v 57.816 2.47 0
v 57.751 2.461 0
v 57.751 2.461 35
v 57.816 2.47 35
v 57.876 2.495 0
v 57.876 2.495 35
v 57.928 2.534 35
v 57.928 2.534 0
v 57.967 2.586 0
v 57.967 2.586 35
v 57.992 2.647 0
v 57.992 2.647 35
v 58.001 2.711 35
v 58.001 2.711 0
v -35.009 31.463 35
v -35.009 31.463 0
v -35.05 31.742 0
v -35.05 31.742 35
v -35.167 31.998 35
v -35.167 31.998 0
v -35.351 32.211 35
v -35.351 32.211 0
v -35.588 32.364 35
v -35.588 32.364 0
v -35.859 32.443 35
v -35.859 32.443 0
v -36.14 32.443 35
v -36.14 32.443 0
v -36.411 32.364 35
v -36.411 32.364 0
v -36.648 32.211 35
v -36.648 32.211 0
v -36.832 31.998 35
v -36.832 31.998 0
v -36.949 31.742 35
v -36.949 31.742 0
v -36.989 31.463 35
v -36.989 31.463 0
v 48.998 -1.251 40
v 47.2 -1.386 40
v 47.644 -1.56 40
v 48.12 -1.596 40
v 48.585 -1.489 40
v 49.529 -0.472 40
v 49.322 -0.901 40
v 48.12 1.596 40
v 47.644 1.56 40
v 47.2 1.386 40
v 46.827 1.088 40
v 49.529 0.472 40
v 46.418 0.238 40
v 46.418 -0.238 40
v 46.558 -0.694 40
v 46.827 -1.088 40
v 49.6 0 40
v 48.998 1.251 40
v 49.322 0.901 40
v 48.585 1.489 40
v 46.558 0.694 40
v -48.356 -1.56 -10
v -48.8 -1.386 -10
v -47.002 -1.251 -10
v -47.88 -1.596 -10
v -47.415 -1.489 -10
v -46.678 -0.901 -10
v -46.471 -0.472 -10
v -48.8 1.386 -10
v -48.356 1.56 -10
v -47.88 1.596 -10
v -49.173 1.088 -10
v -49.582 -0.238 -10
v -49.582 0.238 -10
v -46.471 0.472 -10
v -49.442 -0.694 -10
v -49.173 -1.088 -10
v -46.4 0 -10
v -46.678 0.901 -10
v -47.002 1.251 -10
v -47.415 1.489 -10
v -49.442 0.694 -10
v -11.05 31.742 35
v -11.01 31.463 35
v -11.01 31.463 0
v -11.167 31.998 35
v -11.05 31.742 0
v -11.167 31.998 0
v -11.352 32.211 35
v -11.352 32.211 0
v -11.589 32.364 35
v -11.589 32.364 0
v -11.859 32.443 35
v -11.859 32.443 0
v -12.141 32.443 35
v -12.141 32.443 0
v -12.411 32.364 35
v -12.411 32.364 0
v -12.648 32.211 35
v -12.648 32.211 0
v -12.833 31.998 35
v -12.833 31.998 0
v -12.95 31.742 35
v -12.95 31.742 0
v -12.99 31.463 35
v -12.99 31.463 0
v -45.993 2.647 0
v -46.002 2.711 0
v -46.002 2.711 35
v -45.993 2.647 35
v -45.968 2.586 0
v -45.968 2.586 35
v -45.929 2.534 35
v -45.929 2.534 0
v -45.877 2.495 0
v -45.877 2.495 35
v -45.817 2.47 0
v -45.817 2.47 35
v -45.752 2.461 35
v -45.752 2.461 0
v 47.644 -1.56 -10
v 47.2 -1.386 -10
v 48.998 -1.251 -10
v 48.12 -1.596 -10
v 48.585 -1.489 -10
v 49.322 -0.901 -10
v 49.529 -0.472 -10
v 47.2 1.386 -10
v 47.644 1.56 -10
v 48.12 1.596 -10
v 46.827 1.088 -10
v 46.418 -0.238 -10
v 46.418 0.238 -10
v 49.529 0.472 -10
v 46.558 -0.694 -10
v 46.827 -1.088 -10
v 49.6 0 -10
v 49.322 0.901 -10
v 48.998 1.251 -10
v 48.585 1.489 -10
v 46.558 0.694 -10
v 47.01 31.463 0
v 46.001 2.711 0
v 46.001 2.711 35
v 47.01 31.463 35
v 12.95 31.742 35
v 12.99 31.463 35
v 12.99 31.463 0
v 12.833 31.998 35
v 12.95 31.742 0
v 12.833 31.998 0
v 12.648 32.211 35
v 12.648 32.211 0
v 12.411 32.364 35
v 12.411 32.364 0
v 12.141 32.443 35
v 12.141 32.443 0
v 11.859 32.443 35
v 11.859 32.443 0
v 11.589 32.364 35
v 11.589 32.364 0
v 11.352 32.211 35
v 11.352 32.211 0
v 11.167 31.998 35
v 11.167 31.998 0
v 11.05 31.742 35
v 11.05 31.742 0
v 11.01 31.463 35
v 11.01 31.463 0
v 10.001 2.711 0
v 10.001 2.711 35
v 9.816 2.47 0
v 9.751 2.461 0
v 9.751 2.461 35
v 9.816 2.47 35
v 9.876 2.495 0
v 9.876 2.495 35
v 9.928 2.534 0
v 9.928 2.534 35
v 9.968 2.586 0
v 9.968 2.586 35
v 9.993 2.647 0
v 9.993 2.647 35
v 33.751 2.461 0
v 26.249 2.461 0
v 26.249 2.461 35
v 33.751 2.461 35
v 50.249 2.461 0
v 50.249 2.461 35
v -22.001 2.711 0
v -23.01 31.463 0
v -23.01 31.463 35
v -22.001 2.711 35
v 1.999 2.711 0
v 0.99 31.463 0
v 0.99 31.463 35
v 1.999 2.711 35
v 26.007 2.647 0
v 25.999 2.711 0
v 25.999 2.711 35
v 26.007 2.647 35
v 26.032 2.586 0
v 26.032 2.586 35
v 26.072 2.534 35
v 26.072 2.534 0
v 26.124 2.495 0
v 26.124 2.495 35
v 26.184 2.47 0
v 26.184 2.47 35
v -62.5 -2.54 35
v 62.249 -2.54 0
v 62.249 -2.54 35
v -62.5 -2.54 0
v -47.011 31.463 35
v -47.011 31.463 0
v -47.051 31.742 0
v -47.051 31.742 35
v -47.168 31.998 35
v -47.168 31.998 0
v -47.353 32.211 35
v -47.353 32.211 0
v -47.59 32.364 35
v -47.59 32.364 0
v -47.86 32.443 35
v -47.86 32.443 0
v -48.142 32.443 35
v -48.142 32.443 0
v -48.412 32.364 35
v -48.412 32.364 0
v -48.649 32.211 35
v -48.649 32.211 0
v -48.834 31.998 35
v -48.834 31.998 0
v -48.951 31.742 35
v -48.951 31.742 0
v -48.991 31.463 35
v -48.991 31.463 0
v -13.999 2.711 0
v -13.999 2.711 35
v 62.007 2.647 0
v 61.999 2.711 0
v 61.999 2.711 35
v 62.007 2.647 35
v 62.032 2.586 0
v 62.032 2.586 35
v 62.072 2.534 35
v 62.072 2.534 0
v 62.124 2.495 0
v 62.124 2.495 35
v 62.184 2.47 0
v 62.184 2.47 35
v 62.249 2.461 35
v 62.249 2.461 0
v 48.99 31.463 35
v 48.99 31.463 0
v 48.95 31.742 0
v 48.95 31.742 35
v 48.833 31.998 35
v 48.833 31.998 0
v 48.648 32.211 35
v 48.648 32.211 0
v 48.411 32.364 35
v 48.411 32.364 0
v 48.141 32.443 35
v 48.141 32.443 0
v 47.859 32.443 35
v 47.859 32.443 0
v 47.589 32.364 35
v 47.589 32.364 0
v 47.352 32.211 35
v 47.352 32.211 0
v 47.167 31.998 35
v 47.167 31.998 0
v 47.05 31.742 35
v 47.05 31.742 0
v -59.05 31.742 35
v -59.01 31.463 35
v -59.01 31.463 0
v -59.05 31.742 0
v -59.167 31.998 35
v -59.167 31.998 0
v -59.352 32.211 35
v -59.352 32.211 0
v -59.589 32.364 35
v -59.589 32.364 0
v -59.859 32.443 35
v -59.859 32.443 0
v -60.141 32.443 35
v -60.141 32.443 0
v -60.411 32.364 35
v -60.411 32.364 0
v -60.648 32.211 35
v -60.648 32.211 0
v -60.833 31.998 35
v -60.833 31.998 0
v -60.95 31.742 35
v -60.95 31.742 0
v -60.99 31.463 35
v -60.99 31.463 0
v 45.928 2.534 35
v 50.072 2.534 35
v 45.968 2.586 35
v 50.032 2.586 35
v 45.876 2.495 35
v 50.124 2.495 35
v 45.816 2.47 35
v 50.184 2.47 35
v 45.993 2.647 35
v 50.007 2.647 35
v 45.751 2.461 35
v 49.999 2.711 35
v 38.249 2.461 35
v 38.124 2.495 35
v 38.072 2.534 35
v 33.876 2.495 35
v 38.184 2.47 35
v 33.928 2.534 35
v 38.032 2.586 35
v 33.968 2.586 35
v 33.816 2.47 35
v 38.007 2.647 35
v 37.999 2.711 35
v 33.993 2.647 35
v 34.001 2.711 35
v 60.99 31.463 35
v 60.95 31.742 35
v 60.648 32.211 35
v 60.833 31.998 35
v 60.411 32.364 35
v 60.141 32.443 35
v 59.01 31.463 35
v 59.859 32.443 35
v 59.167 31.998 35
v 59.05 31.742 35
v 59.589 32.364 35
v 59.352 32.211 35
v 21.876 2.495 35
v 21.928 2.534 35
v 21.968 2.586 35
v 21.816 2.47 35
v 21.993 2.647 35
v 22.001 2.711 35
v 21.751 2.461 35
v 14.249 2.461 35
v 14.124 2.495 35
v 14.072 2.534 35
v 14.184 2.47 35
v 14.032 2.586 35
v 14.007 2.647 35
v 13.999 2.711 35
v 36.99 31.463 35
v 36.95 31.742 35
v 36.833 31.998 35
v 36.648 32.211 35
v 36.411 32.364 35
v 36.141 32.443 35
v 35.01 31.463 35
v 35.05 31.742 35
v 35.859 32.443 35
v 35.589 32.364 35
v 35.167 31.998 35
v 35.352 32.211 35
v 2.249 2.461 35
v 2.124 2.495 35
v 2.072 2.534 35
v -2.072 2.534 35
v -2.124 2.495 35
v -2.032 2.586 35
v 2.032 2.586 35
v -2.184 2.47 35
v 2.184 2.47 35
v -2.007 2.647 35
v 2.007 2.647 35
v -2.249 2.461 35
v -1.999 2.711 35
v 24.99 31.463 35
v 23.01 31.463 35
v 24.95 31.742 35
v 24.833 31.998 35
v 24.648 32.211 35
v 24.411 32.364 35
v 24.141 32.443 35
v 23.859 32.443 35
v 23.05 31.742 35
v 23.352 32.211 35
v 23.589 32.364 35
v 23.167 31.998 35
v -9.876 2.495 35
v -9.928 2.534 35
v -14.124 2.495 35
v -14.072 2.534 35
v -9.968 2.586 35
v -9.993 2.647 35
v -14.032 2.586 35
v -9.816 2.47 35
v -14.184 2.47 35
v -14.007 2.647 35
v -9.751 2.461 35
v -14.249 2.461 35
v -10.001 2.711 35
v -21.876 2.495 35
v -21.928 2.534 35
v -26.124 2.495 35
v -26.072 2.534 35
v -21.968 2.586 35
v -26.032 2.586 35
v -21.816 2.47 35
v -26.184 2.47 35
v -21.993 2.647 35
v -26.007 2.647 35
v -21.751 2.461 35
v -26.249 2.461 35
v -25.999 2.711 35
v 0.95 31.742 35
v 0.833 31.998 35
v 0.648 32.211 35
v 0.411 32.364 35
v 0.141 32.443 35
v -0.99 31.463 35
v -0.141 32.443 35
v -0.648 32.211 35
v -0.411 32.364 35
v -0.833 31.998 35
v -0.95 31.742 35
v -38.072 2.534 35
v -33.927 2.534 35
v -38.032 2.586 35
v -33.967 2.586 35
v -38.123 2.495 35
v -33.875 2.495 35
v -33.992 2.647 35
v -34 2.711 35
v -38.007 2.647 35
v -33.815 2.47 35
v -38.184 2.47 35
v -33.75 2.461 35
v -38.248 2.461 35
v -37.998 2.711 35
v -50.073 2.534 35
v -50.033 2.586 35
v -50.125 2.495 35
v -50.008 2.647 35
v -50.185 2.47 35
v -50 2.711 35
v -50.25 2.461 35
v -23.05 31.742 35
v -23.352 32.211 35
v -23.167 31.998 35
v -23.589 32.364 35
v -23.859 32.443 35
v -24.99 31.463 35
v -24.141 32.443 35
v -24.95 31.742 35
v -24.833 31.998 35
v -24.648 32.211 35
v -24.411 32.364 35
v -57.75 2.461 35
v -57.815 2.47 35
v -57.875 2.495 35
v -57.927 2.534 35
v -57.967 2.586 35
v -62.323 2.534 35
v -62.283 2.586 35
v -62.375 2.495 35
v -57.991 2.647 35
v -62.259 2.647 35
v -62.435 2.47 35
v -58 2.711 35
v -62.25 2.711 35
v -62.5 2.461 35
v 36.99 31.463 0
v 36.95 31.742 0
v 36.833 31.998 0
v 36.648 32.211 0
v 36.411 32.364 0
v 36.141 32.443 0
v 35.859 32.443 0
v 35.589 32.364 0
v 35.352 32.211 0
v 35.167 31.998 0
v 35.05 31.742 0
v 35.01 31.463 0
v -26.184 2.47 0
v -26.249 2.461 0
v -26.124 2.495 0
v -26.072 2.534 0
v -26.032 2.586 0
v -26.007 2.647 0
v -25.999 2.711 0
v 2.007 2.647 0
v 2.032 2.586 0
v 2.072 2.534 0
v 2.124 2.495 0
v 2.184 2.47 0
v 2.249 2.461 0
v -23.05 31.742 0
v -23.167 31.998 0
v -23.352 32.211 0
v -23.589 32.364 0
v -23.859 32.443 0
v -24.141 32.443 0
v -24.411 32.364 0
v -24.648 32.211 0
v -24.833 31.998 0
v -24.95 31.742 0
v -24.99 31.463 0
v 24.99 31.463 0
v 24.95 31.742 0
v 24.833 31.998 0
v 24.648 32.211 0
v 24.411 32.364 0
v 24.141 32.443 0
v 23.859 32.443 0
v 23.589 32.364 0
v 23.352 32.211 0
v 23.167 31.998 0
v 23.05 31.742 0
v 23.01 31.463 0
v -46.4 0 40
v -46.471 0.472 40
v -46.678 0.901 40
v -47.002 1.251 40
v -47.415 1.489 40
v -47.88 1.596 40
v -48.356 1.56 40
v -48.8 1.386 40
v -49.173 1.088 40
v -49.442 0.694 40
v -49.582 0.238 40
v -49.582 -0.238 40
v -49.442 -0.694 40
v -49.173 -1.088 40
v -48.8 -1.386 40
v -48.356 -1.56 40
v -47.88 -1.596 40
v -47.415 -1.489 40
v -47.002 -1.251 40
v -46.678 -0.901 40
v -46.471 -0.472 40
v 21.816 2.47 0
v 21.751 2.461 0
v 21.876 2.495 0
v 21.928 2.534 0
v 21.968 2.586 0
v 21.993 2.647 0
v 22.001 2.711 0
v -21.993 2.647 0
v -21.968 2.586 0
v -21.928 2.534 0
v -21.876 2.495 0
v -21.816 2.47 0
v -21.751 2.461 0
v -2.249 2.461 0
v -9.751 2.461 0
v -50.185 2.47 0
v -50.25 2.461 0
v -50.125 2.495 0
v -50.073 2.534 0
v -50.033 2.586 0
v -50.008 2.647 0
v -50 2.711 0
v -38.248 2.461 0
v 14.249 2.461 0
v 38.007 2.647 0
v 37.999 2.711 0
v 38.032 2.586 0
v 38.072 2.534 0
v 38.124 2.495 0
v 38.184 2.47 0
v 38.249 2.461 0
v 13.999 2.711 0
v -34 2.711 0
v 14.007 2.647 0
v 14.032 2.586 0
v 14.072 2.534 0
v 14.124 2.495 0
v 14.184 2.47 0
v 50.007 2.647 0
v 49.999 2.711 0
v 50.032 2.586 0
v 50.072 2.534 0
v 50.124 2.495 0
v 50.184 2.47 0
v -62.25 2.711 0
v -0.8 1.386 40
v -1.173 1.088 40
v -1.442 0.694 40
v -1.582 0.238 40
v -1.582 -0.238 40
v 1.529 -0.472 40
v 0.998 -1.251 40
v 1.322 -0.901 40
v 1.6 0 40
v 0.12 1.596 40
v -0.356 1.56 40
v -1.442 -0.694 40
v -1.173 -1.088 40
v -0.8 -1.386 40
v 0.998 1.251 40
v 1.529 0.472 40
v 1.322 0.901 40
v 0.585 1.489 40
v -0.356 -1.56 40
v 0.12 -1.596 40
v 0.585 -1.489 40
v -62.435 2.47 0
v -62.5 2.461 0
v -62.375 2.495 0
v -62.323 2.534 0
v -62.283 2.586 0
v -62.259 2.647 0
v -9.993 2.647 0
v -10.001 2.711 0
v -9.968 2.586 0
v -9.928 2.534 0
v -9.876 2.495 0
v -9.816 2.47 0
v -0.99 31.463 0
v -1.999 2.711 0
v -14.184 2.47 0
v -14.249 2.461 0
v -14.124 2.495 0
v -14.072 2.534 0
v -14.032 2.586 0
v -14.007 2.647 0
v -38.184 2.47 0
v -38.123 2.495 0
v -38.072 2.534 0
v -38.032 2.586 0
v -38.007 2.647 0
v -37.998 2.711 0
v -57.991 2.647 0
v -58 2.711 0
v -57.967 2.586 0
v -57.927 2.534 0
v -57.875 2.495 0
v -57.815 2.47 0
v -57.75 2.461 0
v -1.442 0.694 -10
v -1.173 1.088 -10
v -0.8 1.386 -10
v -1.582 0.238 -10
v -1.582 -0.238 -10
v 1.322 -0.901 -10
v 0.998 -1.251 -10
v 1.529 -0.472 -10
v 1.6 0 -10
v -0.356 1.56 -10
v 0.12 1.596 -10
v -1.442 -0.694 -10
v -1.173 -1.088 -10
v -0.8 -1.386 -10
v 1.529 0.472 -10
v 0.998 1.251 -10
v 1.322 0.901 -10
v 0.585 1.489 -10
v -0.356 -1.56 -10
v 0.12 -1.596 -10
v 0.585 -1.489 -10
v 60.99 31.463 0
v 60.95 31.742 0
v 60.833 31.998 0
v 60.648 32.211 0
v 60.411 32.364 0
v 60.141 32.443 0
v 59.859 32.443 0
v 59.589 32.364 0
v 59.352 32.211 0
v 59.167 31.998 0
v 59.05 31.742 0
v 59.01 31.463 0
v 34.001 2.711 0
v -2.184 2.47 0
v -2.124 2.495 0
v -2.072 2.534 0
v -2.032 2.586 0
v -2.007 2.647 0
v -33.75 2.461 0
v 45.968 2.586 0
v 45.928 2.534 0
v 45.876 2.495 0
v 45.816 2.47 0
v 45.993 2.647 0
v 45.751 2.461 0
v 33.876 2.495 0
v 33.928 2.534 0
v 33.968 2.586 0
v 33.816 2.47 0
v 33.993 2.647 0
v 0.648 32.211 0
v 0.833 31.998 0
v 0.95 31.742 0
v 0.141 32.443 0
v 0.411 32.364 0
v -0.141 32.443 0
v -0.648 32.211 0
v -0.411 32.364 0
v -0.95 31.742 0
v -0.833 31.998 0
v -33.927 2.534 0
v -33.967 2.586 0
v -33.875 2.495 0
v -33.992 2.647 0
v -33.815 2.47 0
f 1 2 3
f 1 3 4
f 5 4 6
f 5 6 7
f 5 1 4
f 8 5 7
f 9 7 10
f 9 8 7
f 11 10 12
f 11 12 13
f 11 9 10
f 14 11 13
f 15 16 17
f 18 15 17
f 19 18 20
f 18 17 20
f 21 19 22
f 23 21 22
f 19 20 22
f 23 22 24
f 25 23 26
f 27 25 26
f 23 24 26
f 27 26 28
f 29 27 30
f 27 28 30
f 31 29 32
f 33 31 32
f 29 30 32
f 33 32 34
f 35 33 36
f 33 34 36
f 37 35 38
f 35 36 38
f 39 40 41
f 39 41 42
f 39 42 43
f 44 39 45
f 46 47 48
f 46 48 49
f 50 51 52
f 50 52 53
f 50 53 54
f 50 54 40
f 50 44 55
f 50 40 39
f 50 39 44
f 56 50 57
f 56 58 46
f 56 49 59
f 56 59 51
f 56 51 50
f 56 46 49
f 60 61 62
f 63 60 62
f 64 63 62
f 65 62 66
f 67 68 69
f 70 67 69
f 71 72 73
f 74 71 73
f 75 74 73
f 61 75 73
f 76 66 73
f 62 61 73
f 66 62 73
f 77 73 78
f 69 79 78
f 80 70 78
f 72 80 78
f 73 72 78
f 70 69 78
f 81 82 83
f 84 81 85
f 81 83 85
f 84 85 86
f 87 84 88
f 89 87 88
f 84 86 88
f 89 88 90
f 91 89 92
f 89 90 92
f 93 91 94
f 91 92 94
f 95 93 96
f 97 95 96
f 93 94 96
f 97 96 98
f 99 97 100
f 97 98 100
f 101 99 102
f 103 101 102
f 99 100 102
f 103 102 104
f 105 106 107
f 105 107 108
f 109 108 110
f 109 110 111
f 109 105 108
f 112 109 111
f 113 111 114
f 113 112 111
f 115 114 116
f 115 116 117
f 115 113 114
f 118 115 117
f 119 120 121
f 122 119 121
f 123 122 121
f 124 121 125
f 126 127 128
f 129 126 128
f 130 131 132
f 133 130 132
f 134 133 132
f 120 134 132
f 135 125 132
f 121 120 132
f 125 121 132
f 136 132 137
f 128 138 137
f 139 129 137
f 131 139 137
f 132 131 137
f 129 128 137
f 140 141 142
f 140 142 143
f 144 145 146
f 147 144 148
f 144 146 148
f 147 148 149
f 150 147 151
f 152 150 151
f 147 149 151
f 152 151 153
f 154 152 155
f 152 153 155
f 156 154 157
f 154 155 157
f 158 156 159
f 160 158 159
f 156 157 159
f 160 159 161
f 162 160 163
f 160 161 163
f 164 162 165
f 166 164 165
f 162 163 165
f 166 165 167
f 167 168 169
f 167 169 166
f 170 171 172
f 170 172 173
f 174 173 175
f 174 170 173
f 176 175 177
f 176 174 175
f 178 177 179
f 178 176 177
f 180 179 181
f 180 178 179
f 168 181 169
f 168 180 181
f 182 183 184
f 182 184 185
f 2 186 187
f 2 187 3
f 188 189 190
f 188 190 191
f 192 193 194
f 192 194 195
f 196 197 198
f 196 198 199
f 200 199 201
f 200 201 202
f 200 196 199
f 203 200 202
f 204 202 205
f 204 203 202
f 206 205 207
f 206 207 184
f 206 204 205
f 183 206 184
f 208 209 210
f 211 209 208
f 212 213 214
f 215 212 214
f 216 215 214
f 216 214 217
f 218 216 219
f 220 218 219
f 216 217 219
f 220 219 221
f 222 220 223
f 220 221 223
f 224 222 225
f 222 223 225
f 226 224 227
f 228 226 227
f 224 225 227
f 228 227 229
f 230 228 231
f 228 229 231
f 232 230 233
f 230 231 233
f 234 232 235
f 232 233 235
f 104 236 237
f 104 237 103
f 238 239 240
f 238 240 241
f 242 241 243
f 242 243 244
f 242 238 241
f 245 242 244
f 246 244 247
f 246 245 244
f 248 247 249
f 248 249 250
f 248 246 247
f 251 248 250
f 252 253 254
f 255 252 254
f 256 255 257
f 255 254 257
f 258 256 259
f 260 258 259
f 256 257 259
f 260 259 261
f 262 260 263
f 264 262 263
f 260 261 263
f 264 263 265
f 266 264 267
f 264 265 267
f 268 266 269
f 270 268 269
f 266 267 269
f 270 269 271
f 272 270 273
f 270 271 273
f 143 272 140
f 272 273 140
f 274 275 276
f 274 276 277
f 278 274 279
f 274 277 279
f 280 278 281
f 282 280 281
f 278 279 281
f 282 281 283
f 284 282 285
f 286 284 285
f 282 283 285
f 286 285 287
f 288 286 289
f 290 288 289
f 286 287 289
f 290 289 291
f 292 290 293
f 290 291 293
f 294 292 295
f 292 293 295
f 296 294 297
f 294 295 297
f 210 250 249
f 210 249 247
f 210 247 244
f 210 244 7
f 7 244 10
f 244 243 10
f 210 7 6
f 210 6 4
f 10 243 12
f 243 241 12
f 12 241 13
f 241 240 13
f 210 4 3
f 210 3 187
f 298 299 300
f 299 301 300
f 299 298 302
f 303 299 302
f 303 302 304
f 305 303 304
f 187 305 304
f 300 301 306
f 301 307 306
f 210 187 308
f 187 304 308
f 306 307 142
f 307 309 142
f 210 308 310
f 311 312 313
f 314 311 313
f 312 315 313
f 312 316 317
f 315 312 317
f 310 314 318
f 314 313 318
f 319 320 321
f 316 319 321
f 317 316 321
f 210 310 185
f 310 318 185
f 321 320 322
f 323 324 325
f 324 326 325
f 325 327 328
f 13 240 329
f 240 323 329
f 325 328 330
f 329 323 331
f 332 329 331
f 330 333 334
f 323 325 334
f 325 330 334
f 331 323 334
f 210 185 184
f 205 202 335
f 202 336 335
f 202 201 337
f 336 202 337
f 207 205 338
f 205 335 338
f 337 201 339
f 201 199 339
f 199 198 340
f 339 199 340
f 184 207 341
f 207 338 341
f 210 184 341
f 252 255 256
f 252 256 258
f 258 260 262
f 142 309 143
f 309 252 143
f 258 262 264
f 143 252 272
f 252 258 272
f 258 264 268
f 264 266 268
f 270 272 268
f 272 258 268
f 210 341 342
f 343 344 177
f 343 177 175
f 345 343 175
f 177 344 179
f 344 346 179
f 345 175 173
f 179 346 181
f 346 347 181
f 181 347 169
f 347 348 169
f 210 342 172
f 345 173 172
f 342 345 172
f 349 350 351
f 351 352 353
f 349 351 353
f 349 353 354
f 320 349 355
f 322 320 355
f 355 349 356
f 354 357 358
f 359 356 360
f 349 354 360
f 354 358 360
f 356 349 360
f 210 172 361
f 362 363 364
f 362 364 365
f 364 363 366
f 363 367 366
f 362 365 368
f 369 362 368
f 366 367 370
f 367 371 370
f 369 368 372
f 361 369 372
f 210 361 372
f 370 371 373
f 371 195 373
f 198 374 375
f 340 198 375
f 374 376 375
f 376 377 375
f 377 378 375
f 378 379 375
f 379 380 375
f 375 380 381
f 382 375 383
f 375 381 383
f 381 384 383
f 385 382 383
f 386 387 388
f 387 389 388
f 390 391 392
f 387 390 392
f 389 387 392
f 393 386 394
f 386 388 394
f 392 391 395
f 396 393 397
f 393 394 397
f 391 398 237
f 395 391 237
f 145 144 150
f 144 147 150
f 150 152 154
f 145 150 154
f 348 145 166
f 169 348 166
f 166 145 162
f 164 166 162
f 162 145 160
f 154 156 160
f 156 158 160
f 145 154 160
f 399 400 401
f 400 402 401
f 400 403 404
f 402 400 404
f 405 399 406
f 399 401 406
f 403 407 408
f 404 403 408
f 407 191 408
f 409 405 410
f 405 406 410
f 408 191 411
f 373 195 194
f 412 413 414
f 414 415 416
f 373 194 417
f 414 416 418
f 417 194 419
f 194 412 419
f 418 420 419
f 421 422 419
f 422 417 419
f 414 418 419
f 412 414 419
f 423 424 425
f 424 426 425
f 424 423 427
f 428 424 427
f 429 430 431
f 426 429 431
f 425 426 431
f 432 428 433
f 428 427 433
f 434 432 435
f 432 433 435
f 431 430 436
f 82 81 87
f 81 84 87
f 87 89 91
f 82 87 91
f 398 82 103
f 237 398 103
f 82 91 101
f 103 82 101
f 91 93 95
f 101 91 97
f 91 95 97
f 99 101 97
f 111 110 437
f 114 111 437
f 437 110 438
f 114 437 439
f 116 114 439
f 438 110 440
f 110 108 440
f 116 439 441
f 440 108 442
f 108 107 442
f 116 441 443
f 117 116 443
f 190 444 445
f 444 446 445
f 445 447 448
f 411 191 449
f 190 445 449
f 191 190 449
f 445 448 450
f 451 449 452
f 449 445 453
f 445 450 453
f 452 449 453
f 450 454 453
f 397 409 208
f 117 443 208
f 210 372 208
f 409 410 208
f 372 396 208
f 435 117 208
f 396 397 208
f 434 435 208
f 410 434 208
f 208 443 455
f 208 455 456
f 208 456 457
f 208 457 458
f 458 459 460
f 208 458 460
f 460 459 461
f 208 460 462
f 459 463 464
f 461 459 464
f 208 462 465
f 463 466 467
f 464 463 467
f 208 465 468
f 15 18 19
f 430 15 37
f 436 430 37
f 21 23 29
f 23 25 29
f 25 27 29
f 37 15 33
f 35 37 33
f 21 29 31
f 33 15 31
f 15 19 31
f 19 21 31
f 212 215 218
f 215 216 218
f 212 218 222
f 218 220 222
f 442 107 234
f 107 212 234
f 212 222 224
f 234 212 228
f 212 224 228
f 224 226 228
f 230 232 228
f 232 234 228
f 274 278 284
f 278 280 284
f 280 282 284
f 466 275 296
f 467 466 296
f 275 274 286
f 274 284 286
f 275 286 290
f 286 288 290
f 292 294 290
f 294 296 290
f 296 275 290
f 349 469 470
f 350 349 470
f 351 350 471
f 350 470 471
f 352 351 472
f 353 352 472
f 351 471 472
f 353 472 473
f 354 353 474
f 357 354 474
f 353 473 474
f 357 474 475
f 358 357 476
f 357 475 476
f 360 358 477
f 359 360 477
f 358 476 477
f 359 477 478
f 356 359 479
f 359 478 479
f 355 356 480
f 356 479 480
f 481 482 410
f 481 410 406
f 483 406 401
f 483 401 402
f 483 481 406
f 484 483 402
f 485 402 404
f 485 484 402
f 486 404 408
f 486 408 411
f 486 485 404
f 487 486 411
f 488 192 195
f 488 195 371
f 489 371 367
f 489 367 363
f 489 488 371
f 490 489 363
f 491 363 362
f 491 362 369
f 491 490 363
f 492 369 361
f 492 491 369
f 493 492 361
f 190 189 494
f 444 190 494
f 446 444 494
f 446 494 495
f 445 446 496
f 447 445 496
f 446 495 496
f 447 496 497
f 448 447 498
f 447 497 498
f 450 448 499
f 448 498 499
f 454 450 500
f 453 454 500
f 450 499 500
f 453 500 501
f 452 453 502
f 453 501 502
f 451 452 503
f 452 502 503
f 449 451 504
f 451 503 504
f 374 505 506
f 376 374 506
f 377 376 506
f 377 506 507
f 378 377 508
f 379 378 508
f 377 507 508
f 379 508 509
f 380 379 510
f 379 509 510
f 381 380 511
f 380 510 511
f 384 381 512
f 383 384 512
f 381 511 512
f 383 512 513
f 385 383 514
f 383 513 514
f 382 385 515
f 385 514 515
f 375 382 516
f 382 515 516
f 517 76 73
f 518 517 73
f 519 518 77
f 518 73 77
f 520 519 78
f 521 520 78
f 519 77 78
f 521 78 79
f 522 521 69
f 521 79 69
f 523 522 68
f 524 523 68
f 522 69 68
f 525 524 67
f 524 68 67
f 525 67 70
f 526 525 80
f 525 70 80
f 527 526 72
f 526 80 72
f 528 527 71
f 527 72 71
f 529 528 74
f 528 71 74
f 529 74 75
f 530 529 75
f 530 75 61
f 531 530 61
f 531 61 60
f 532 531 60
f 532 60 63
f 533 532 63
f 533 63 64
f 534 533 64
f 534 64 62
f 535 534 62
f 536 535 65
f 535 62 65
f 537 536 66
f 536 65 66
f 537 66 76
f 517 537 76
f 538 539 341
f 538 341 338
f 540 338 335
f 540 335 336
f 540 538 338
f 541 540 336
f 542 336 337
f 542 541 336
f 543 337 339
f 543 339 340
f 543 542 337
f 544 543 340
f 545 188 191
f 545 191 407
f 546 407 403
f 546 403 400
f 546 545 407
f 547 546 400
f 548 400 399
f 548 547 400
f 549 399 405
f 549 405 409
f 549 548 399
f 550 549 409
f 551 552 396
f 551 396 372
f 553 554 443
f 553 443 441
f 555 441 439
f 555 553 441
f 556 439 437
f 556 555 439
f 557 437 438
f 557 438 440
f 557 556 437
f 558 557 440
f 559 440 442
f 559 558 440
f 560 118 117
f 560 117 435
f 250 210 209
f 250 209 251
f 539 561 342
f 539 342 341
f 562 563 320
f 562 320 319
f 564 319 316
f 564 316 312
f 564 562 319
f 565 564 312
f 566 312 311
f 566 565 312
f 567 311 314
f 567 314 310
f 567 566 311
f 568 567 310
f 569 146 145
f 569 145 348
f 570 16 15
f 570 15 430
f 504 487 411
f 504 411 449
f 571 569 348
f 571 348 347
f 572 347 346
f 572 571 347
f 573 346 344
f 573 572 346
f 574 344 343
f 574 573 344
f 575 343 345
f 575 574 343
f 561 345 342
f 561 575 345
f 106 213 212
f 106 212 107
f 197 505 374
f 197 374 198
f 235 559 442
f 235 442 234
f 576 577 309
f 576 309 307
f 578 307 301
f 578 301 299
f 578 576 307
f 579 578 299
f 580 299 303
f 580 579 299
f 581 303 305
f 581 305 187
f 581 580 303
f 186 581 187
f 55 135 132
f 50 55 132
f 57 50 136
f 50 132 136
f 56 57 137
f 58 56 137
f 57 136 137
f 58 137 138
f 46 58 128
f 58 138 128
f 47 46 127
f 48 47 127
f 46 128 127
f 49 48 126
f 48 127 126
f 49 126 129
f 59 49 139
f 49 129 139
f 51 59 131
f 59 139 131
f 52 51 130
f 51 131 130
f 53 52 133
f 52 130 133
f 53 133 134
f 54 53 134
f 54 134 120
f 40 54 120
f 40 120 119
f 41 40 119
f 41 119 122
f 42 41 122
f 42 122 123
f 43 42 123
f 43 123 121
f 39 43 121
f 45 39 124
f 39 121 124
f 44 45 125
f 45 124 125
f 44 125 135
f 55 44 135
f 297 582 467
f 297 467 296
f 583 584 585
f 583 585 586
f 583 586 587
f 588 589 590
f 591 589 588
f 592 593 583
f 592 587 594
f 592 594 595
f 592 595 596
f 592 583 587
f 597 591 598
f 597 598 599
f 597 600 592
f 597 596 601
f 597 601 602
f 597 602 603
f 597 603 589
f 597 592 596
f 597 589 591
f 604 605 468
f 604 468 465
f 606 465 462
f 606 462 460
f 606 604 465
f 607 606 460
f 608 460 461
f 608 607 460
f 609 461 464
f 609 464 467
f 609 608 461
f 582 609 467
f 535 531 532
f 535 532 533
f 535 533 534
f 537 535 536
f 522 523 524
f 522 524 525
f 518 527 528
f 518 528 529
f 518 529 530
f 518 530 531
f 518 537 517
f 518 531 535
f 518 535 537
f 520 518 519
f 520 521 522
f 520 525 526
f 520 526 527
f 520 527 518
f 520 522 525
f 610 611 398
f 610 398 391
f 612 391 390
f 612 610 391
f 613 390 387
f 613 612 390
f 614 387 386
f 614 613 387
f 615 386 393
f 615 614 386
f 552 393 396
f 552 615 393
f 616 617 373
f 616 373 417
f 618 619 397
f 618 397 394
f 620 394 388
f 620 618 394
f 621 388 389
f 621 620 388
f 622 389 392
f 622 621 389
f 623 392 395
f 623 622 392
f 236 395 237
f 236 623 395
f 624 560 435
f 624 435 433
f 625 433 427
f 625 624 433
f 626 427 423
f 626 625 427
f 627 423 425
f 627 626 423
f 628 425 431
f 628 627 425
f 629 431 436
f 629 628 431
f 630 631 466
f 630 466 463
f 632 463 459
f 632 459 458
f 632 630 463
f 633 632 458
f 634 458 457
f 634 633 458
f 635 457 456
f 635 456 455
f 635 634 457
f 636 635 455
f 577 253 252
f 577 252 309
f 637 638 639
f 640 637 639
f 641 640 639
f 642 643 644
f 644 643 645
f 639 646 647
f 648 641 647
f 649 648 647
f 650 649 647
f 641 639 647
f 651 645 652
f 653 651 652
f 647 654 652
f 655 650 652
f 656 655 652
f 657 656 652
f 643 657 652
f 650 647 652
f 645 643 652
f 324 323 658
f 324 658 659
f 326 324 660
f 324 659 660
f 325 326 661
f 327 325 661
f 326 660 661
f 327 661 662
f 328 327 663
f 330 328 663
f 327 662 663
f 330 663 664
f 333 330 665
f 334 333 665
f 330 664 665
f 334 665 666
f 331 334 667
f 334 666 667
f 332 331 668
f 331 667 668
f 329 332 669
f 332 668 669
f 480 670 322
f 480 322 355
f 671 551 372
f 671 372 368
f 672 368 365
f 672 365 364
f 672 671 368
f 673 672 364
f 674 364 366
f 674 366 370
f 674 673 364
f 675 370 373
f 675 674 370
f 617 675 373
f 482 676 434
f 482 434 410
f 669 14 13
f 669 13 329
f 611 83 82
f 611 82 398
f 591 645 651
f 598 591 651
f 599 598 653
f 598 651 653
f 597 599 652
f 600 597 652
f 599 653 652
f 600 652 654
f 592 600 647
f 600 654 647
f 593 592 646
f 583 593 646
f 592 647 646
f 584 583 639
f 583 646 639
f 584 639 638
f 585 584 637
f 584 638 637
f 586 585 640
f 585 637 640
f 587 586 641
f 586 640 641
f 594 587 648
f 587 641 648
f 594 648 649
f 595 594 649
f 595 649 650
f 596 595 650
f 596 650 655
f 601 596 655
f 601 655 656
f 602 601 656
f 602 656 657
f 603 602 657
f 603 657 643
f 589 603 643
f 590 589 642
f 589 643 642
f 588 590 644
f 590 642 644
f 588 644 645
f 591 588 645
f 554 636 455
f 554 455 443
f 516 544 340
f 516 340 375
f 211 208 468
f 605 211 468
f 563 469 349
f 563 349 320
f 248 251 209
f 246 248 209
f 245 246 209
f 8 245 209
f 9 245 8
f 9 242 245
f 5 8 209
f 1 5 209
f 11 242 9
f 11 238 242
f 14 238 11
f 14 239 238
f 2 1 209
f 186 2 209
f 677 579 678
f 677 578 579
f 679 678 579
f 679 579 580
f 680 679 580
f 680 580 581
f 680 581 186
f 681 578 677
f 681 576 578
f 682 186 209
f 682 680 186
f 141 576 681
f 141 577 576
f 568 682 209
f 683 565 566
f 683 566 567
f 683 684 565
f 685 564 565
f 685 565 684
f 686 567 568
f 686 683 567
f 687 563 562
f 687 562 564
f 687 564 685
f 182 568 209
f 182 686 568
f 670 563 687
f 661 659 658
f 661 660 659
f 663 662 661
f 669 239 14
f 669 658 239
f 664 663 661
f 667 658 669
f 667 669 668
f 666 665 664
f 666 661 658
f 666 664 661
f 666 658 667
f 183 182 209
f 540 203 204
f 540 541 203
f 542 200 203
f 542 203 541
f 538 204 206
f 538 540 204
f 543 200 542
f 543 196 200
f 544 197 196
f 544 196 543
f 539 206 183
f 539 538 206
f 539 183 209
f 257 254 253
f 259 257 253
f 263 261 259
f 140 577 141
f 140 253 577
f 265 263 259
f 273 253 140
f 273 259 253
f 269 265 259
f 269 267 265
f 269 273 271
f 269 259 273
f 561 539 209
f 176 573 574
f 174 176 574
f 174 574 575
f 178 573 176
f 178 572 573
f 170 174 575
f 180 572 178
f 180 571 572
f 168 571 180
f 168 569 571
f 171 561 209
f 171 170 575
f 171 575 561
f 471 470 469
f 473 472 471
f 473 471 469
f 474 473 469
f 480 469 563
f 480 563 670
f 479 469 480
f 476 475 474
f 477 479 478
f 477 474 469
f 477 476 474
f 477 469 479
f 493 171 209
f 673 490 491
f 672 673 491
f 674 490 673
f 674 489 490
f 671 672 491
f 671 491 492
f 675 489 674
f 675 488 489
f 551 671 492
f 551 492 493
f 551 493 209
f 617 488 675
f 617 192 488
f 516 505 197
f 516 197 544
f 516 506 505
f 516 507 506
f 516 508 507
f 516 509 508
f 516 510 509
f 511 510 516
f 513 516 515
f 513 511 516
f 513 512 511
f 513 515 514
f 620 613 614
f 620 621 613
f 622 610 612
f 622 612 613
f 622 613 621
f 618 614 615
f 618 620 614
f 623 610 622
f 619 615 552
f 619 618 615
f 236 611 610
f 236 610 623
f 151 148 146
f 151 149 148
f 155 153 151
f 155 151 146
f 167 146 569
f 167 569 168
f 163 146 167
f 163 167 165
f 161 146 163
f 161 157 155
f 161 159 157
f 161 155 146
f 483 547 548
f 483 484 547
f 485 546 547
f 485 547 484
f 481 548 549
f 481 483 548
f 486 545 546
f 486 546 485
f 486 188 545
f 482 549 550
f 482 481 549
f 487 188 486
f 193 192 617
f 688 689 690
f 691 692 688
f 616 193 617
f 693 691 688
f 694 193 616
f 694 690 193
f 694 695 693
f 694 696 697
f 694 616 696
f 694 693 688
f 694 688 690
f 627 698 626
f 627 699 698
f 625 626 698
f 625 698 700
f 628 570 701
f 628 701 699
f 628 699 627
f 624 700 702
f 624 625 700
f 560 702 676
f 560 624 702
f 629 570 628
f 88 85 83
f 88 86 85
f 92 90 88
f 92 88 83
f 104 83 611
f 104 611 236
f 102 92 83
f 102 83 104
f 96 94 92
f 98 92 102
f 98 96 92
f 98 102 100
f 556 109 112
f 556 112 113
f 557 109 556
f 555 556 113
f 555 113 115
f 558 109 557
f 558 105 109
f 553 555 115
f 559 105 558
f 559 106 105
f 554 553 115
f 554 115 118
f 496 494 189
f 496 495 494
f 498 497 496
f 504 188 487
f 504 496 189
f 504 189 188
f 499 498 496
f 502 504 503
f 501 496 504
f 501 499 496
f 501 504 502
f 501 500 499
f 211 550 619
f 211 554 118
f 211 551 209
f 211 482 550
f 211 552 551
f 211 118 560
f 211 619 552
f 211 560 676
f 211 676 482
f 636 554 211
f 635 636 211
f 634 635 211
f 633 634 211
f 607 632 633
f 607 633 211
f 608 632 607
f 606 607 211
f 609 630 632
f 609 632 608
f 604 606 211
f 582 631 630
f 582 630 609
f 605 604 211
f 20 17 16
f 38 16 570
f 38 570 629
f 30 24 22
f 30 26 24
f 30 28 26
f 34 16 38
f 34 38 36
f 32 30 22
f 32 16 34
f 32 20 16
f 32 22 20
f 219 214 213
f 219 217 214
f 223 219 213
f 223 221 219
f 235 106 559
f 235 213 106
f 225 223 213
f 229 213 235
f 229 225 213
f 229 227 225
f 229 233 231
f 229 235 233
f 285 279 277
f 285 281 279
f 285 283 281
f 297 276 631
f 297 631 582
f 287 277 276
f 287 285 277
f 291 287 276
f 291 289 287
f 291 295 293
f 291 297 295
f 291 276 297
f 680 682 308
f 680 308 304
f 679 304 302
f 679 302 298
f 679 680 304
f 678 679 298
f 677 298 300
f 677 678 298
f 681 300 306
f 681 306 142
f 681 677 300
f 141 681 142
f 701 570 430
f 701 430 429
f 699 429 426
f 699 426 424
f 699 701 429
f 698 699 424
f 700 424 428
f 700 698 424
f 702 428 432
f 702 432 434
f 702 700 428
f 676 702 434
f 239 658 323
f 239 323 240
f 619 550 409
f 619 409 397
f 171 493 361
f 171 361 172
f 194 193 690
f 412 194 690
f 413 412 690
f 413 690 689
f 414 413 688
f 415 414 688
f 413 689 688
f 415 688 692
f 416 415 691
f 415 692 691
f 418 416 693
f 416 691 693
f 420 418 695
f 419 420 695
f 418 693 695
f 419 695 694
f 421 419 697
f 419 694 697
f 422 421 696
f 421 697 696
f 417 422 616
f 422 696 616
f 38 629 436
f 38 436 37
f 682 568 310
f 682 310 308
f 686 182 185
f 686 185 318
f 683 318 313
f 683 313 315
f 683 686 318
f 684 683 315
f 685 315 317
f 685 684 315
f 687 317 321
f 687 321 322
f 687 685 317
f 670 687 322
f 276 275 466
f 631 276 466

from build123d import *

# Parameters (mm, degrees)
PAD_DEPTH         = 35
CYLINDER_R        = 1.6
CYLINDER_DEPTH    = 50
CYLINDER001_R     = 1.6
CYLINDER001_DEPTH = 50
CYLINDER002_R     = 1.6
CYLINDER002_DEPTH = 50


with BuildPart() as body:
    # Sketch → Pad (new body)
    with BuildSketch(Plane.XY):
        with BuildLine():
            Line((62.24886, -2.54), (-62.5, -2.54))
            Line((-62.5, -2.54), (-62.5, 2.46126))
            ThreePointArc((-62.5, 2.46126), (-62.323223, 2.534483), (-62.25, 2.71126))
            Line((-62.25, 2.71126), (-60.98988, 31.46298))
            ThreePointArc((-59.00988, 31.46298), (-59.99988, 32.45298), (-60.98988, 31.46298))
            Line((-59.00988, 31.46298), (-58, 2.71126))
            ThreePointArc((-58, 2.71126), (-57.926777, 2.534483), (-57.75, 2.46126))
            Line((-57.75, 2.46126), (-50.2499, 2.46126))
            ThreePointArc((-50.2499, 2.46126), (-50.073123, 2.534483), (-49.9999, 2.71126))
            Line((-49.9999, 2.71126), (-48.99092, 31.46298))
            ThreePointArc((-47.01092, 31.46298), (-48.00092, 32.45298), (-48.99092, 31.46298))
            Line((-47.01092, 31.46298), (-46.00194, 2.71126))
            ThreePointArc((-46.00194, 2.71126), (-45.928717, 2.534483), (-45.75194, 2.46126))
            Line((-45.75194, 2.46126), (-38.2484, 2.46126))
            ThreePointArc((-38.2484, 2.46126), (-38.071623, 2.534483), (-37.9984, 2.71126))
            Line((-37.9984, 2.71126), (-36.98942, 31.46298))
            ThreePointArc((-35.00942, 31.46298), (-35.99942, 32.45298), (-36.98942, 31.46298))
            Line((-35.00942, 31.46298), (-34.00044, 2.71126))
            ThreePointArc((-34.00044, 2.71126), (-33.927217, 2.534483), (-33.75044, 2.46126))
            Line((-33.75044, 2.46126), (-26.24898, 2.46126))
            ThreePointArc((-26.24898, 2.46126), (-26.072203, 2.534483), (-25.99898, 2.71126))
            Line((-25.99898, 2.71126), (-24.99, 31.46298))
            ThreePointArc((-23.01, 31.46298), (-24, 32.45298), (-24.99, 31.46298))
            Line((-23.01, 31.46298), (-22.00102, 2.71126))
            ThreePointArc((-22.00102, 2.71126), (-21.927797, 2.534483), (-21.75102, 2.46126))
            Line((-21.75102, 2.46126), (-14.24898, 2.46126))
            ThreePointArc((-14.24898, 2.46126), (-14.072203, 2.534483), (-13.99898, 2.71126))
            Line((-13.99898, 2.71126), (-12.99, 31.46298))
            ThreePointArc((-11.01, 31.46298), (-12, 32.45298), (-12.99, 31.46298))
            Line((-11.01, 31.46298), (-10.00102, 2.71126))
            ThreePointArc((-10.00102, 2.71126), (-9.927797, 2.534483), (-9.75102, 2.46126))
            Line((-9.75102, 2.46126), (-2.24898, 2.46126))
            ThreePointArc((-2.24898, 2.46126), (-2.072203, 2.534483), (-1.99898, 2.71126))
            Line((-1.99898, 2.71126), (-0.99, 31.46298))
            ThreePointArc((0.99, 31.46298), (0, 32.45298), (-0.99, 31.46298))
            Line((0.99, 31.46298), (1.99898, 2.71126))
            ThreePointArc((1.99898, 2.71126), (2.072203, 2.534483), (2.24898, 2.46126))
            Line((2.24898, 2.46126), (9.75102, 2.46126))
            ThreePointArc((9.75102, 2.46126), (9.927797, 2.534483), (10.00102, 2.71126))
            Line((10.00102, 2.71126), (11.01, 31.46298))
            ThreePointArc((12.99, 31.46298), (12, 32.45298), (11.01, 31.46298))
            Line((12.99, 31.46298), (13.99898, 2.71126))
            ThreePointArc((13.99898, 2.71126), (14.072203, 2.534483), (14.24898, 2.46126))
            Line((14.24898, 2.46126), (21.75102, 2.46126))
            ThreePointArc((21.75102, 2.46126), (21.927797, 2.534483), (22.00102, 2.71126))
            Line((22.00102, 2.71126), (23.01, 31.46298))
            ThreePointArc((24.99, 31.46298), (24, 32.45298), (23.01, 31.46298))
            Line((24.99, 31.46298), (25.99898, 2.71126))
            ThreePointArc((25.99898, 2.71126), (26.072203, 2.534483), (26.24898, 2.46126))
            Line((26.24898, 2.46126), (33.75102, 2.46126))
            ThreePointArc((33.75102, 2.46126), (33.927797, 2.534483), (34.00102, 2.71126))
            Line((34.00102, 2.71126), (35.01, 31.46298))
            ThreePointArc((36.99, 31.46298), (36, 32.45298), (35.01, 31.46298))
            Line((36.99, 31.46298), (37.99898, 2.71126))
            ThreePointArc((37.99898, 2.71126), (38.072203, 2.534483), (38.24898, 2.46126))
            Line((38.24898, 2.46126), (45.75102, 2.46126))
            ThreePointArc((45.75102, 2.46126), (45.927797, 2.534483), (46.00102, 2.71126))
            Line((46.00102, 2.71126), (47.01, 31.46298))
            ThreePointArc((48.99, 31.46298), (48, 32.45298), (47.01, 31.46298))
            Line((48.99, 31.46298), (49.99898, 2.71126))
            ThreePointArc((49.99898, 2.71126), (50.072203, 2.534483), (50.24898, 2.46126))
            Line((50.24898, 2.46126), (57.7509, 2.46126))
            ThreePointArc((57.7509, 2.46126), (57.927677, 2.534483), (58.0009, 2.71126))
            Line((58.0009, 2.71126), (59.00988, 31.46298))
            ThreePointArc((60.98988, 31.46298), (59.99988, 32.45298), (59.00988, 31.46298))
            Line((60.98988, 31.46298), (61.99886, 2.71126))
            ThreePointArc((61.99886, 2.71126), (62.072083, 2.534483), (62.24886, 2.46126))
            Line((62.24886, -2.54), (62.24886, 2.46126))
        make_face()
    extrude(amount=PAD_DEPTH)


with BuildPart() as cylinder:
    # Cylinder → Cylinder (new body)
    with BuildSketch(Plane.XY.offset(-10)):
        Circle(CYLINDER_R)
    extrude(amount=CYLINDER_DEPTH)


with BuildPart() as cylinder001:
    # Cylinder001 → Cylinder001 (new body)
    with BuildSketch(Plane(origin=(-48, 0, -10), x_dir=(1, 0, 0), z_dir=(0, 0, 1))):
        Circle(CYLINDER001_R)
    extrude(amount=CYLINDER001_DEPTH)


with BuildPart() as cylinder002:
    # Cylinder002 → Cylinder002 (new body)
    with BuildSketch(Plane(origin=(48, 0, -10), x_dir=(1, 0, 0), z_dir=(0, 0, 1))):
        Circle(CYLINDER002_R)
    extrude(amount=CYLINDER002_DEPTH)


solid = Compound([body.part, cylinder.part, cylinder001.part, cylinder002.part])
